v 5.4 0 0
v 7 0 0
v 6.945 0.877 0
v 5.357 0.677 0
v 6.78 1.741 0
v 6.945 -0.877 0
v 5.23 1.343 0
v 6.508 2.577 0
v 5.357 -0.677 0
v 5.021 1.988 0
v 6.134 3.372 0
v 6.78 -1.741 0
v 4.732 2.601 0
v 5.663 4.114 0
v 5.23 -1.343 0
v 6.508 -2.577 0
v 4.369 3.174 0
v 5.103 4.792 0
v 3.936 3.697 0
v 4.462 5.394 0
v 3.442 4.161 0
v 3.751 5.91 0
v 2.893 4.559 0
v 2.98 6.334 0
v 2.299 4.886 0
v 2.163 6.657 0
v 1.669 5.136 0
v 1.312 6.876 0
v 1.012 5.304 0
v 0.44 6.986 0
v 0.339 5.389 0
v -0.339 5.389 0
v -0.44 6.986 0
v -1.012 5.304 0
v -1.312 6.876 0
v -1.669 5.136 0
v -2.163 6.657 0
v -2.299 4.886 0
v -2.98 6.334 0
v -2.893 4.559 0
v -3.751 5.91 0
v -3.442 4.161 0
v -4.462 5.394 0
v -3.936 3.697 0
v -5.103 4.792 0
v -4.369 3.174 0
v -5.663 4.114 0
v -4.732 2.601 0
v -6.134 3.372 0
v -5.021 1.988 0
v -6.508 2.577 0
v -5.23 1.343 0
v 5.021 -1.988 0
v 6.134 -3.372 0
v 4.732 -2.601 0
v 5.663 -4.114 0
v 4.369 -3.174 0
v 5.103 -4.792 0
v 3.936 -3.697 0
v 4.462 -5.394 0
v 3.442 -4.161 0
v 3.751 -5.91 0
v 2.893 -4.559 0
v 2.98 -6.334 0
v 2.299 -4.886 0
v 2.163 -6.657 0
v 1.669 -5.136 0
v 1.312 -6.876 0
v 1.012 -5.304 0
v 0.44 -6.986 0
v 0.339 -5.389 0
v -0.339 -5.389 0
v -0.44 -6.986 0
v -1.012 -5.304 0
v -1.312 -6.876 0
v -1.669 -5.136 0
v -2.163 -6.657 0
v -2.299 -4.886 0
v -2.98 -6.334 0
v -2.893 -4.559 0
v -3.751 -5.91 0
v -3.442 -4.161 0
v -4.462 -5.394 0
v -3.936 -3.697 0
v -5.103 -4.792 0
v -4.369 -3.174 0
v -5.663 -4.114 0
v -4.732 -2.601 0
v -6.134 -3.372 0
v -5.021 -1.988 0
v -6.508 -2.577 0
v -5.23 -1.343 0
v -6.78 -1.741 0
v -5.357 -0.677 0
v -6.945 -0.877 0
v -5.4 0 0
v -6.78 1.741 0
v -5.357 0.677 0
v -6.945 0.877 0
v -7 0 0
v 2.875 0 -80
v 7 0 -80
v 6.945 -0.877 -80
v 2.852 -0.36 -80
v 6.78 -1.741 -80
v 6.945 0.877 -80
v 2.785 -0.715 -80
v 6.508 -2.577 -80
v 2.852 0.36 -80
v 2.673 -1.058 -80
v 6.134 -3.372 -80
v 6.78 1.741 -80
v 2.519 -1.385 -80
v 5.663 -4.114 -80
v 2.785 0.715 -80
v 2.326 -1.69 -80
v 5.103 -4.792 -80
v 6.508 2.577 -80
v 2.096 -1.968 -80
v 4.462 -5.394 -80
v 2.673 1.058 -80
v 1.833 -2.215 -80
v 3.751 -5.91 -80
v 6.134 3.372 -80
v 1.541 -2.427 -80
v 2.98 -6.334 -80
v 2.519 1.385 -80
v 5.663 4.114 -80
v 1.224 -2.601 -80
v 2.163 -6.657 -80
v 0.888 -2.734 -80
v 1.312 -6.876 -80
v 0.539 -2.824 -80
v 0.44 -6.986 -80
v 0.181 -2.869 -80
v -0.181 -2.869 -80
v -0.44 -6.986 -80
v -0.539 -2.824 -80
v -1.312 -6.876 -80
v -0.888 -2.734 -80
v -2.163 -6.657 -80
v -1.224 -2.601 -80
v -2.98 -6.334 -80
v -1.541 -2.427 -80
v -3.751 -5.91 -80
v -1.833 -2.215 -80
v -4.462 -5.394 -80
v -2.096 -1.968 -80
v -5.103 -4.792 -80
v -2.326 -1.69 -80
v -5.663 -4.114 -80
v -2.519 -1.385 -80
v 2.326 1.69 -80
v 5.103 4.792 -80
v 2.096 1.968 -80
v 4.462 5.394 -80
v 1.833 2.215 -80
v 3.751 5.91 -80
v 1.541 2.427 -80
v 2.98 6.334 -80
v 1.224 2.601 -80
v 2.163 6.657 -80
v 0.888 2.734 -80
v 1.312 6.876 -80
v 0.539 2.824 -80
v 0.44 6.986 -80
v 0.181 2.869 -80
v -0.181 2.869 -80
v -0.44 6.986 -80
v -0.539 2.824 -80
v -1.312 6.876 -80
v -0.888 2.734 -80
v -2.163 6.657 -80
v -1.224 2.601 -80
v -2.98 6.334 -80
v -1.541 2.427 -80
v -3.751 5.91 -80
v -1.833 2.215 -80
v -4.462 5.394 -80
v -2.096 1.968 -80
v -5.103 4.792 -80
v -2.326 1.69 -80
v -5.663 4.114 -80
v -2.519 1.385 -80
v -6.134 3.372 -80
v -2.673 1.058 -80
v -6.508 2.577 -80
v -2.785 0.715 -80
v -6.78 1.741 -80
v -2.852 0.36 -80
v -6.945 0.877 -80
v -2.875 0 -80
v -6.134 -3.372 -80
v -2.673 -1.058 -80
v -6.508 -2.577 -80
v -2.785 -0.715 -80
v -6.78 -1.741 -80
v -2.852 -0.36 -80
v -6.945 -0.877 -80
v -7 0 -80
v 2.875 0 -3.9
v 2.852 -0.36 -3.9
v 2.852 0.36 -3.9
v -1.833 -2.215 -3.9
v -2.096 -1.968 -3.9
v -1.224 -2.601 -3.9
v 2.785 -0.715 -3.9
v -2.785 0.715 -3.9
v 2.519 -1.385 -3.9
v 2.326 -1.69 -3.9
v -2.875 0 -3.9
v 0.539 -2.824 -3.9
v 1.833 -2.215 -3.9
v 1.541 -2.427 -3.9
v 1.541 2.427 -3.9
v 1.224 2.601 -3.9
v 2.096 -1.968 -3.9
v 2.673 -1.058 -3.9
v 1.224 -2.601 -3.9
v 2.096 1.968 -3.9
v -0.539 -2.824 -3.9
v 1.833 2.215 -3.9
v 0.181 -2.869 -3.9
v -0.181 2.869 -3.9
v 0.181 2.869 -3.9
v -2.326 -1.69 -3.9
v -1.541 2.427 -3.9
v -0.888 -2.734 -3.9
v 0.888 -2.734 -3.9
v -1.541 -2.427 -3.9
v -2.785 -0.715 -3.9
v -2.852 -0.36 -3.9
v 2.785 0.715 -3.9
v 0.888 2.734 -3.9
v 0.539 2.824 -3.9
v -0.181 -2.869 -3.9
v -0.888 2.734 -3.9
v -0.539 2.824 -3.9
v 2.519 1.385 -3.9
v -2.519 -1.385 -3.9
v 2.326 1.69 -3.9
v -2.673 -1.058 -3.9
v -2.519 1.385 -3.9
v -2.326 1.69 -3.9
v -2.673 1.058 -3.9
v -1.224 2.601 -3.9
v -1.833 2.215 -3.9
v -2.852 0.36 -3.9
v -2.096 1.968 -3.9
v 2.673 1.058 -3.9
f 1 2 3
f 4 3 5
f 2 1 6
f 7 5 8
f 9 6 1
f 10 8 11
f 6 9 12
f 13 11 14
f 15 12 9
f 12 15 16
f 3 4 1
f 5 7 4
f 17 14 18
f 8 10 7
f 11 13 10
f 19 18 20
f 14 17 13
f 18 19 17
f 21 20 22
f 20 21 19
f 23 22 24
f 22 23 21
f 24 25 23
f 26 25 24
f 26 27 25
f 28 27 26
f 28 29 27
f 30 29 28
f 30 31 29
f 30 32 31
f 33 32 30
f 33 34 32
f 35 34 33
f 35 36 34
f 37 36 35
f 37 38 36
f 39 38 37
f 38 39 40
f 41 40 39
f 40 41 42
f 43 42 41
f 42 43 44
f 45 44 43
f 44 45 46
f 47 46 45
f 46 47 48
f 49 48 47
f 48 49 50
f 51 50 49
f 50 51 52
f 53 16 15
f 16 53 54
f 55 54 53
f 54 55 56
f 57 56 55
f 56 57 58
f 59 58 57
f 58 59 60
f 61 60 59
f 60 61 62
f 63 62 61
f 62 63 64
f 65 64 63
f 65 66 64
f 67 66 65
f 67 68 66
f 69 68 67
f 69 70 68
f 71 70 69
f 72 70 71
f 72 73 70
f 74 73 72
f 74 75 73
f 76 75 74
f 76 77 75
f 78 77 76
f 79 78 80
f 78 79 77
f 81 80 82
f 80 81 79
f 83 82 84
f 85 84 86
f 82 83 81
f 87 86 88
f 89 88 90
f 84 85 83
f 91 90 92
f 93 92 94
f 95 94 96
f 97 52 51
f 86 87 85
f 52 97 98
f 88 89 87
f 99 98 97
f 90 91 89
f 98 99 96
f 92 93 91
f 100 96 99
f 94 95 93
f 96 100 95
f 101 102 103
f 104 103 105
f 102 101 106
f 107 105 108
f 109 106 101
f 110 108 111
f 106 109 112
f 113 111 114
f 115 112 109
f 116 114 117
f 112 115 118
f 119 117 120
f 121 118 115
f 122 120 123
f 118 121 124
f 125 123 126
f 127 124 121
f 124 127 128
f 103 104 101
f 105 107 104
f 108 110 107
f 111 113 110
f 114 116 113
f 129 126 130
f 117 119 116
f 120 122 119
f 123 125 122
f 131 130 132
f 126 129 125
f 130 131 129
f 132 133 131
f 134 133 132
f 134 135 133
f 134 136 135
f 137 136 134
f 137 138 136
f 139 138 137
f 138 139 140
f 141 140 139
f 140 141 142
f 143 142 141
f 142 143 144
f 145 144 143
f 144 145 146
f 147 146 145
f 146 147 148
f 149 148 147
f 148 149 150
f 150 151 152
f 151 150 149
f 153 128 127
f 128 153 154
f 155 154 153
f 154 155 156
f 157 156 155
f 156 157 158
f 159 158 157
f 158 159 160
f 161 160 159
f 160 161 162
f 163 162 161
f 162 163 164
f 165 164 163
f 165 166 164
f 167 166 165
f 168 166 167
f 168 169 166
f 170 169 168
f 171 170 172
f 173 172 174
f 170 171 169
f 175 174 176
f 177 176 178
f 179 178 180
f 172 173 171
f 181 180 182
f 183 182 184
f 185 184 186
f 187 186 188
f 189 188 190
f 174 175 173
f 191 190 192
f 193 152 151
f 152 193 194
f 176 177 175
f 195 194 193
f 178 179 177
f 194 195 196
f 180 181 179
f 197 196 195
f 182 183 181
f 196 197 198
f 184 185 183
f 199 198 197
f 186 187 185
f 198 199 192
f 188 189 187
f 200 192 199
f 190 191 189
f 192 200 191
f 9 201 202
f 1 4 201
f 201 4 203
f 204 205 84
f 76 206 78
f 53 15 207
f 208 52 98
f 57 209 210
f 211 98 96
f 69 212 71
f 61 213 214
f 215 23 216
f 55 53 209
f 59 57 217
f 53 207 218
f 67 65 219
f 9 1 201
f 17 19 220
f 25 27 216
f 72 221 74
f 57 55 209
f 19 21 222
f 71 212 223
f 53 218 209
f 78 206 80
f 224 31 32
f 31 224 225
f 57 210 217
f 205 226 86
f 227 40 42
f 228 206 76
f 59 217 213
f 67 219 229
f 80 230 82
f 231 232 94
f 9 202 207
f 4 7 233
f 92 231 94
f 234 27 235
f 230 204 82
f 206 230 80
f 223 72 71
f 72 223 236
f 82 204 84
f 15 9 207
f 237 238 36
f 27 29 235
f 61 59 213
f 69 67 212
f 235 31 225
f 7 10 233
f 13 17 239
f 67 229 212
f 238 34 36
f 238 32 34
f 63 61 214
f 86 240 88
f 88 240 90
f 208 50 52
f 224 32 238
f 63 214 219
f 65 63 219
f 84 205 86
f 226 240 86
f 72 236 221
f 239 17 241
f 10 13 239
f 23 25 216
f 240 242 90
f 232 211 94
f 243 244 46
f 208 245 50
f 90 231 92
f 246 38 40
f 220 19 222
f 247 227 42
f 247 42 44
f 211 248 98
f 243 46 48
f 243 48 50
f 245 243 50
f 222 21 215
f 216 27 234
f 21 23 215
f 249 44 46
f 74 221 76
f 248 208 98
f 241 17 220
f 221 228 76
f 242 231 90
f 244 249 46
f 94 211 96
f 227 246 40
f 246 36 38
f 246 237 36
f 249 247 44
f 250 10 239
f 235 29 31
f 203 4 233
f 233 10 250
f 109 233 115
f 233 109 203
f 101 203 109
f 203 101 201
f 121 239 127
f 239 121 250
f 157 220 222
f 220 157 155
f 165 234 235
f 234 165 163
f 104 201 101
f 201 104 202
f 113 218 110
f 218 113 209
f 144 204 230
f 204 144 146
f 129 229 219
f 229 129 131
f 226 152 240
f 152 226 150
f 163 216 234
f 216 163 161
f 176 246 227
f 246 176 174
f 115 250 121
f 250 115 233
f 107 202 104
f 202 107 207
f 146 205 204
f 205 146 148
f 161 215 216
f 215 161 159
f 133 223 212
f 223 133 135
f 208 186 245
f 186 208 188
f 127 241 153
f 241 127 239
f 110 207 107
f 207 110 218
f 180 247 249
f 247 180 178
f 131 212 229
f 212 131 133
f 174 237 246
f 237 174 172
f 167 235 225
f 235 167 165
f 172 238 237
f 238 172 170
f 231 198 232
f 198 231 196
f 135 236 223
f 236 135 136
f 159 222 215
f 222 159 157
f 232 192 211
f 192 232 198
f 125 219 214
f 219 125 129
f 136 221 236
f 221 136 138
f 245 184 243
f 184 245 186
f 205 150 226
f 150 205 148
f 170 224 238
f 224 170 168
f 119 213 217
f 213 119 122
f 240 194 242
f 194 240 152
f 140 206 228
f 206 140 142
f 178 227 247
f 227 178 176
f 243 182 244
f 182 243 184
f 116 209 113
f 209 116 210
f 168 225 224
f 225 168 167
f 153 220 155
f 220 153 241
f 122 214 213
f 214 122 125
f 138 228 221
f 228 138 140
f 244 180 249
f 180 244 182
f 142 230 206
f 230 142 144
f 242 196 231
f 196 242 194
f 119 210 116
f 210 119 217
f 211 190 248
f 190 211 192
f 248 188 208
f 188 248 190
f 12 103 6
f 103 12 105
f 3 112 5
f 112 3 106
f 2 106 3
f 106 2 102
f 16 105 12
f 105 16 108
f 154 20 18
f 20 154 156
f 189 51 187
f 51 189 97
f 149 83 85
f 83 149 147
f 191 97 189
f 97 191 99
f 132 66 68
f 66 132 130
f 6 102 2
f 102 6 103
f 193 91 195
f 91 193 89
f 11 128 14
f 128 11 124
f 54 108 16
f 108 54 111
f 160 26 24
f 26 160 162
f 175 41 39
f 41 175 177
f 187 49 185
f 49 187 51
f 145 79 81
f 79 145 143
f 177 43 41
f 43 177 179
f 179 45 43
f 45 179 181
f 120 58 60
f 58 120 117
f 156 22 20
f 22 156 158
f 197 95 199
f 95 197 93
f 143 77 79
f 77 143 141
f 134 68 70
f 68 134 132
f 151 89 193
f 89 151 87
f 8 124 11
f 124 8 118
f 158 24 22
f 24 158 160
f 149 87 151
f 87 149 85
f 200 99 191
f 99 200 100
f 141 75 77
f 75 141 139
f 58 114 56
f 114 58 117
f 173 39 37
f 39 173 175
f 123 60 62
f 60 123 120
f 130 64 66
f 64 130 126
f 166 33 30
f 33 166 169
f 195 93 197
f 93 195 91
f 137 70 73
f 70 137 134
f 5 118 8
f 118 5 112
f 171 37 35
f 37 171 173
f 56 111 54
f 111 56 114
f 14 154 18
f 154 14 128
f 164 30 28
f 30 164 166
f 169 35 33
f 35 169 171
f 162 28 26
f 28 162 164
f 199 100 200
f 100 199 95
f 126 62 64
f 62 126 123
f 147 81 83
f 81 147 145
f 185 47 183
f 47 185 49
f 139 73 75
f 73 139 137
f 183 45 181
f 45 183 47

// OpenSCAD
$fn = 50;


difference() {
	union() {
		translate(v = [0, 0, -80.0000000000]) {
			cylinder(h = 80, r = 7.0000000000);
		}
		cylinder(h = 0, r = 13.0000000000);
	}
	union() {
		translate(v = [0, 0, 0]) {
			rotate(a = [0, 0, 0]) {
				difference() {
					union() {
						#translate(v = [0, 0, -80.0000000000]) {
							cylinder(h = 80, r = 2.6000000000);
						}
						#translate(v = [0, 0, -3.9000000000]) {
							cylinder(h = 3.9000000000, r = 7.0000000000, r1 = 2.8750000000, r2 = 5.4000000000);
						}
						#translate(v = [0, 0, -80.0000000000]) {
							cylinder(h = 80, r = 2.8750000000);
						}
						#translate(v = [0, 0, -80.0000000000]) {
							cylinder(h = 80, r = 2.6000000000);
						}
					}
					union();
				}
			}
		}
	}
}
